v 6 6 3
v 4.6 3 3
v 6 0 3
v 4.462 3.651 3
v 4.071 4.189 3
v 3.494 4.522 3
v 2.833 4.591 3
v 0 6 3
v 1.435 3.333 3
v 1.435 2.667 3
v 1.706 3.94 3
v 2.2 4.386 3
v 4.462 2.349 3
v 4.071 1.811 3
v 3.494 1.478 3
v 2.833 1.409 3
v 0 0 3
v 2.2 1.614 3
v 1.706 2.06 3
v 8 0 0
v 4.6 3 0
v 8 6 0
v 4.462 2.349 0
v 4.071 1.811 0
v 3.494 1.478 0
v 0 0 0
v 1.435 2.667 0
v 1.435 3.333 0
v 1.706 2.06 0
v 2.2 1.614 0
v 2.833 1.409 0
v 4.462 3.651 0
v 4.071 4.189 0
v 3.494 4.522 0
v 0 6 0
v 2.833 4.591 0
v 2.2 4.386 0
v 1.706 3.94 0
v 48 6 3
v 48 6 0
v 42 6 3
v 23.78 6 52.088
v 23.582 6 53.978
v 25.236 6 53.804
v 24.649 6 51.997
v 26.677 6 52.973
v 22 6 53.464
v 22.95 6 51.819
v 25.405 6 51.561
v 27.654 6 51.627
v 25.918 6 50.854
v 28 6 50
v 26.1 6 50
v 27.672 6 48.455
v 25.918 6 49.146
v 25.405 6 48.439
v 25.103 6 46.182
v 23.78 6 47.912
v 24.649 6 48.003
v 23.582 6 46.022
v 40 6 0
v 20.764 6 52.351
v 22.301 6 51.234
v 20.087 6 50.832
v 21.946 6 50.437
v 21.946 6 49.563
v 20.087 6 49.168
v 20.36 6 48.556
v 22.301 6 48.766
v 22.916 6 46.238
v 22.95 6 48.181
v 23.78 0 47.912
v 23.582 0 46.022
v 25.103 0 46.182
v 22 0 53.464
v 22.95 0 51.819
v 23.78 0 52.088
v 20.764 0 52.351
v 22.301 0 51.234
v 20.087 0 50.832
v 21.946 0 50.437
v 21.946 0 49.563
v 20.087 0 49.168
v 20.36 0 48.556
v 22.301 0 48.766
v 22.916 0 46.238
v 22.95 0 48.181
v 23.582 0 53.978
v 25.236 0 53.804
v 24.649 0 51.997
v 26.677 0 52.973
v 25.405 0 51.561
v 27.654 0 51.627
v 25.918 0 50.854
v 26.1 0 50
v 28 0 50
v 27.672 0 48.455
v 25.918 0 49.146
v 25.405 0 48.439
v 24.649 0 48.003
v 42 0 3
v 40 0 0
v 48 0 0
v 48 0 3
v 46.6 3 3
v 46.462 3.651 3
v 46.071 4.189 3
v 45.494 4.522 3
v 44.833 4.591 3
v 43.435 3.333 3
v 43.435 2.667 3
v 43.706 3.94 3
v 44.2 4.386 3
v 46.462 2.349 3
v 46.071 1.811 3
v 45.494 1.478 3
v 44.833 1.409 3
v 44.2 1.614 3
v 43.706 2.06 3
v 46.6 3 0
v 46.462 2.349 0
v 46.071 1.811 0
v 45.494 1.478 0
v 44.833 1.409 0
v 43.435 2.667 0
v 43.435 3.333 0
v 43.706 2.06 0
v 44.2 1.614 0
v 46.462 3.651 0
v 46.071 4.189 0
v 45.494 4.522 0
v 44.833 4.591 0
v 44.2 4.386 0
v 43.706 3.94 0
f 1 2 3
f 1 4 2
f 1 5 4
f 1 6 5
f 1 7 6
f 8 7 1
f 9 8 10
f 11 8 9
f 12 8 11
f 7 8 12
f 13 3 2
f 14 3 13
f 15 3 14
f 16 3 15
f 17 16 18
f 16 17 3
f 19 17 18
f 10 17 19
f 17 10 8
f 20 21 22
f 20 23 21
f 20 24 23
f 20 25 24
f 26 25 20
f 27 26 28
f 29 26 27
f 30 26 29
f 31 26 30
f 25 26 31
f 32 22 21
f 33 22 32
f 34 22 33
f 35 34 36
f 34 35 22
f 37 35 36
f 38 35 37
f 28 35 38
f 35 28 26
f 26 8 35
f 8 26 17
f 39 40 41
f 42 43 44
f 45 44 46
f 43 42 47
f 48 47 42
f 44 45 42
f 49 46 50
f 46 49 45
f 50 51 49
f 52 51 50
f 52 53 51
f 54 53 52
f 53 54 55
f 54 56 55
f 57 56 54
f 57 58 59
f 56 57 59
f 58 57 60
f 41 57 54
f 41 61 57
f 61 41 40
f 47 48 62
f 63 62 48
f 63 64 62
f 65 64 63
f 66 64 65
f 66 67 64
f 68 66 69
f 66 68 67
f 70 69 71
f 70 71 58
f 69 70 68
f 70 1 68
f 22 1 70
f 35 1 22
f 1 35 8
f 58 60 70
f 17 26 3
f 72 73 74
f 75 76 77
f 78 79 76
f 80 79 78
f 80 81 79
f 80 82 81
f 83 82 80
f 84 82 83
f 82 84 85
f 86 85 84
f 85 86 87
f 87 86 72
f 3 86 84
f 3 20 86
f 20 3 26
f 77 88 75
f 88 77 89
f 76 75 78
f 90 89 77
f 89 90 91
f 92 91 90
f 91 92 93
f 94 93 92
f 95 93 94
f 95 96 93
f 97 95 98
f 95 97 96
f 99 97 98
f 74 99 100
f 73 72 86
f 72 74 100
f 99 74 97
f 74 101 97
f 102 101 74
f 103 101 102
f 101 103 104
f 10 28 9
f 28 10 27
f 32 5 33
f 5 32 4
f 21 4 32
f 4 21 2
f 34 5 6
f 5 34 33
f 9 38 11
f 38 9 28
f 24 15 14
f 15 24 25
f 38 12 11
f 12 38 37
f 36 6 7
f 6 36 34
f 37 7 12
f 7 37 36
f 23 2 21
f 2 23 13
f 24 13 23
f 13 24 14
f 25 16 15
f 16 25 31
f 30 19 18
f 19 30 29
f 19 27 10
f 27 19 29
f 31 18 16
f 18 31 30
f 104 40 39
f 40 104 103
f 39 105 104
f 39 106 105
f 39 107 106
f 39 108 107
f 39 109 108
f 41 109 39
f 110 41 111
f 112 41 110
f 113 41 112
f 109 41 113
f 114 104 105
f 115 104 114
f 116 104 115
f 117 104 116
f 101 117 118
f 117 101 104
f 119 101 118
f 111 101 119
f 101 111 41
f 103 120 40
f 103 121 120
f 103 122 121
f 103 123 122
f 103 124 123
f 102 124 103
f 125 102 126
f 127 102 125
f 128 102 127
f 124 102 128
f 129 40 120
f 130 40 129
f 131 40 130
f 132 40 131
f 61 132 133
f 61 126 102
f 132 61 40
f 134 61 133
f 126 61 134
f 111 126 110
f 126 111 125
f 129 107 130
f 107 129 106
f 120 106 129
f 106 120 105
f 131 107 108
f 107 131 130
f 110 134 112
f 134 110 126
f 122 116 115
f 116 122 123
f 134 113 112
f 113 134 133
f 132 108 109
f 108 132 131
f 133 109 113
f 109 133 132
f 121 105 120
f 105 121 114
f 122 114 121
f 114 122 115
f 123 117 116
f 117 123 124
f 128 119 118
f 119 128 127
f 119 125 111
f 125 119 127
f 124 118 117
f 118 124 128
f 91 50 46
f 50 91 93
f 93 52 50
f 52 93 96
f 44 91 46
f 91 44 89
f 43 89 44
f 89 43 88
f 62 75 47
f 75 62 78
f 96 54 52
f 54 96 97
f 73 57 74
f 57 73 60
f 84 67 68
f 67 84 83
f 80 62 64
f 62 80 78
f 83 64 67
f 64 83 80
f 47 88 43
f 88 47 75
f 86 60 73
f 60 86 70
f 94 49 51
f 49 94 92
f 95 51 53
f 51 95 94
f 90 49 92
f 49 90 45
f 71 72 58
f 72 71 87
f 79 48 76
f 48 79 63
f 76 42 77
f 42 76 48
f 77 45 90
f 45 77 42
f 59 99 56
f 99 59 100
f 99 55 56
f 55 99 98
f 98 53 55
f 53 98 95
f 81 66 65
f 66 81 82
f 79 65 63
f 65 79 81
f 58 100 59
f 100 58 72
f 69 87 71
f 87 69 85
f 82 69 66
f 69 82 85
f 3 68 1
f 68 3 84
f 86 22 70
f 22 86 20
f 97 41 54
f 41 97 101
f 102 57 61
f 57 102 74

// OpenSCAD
$fn = 15;

module holder() {
    difference() {
        cube([6, 6, 3]);
        
        translate([3, 3, -1])
            cylinder(d = 3.2, h = 5);
    }
}

module top() {
    rotate([90, 0, 0])
    difference() {
        cylinder(d = 8, h = 6);
        translate([0, 0, -1])
            cylinder(d = 4.2, h = 8);
    }
}

module prism(l, w, h){
    polyhedron(points = [
        [0,0,0],
        [l,0,0],
        [l,w,0],
        [0,w,0],
        [0,w,h],
        [l,w,h]
    ], faces = [
        [0,1,2,3],
        [5,4,3,2],
        [0,4,5,1],
        [0,3,4],
        [5,2,1]
    ]);
}

module adaptor() {
    polyhedron(points = [
        [6, 6, 3],
        [8, 6, 0],
        [8, 0, 0],
        [6, 0, 3],
        [20.5, 6, 49],
        [23, 6, 46.5],
        [23, 0, 46.5],
        [20.5, 0, 49]
    ], faces = [
        [3, 2, 1, 0], // a
        [0, 4, 7, 3], // b
        [1, 5, 4, 0], // c
        [2, 6, 5, 1], // d
        [2, 3, 7, 6], // e
        [4, 5, 6, 7] // f
    ]);
    
    
    translate([8, 0, 0])
        rotate([0, 0, 90])
        prism(6, 2, 3);
    
    
    /*
    difference() {
        translate([6, 0, 3])
            rotate([0, 45, 0])
            translate([0, 0, -5])
            cube([3.5, 6, 5]);
        
        translate([0, 0, -10])
            cube([10, 10, 10]);
    }
    */
}

holder();
translate([42, 0, 0])
    holder();

translate([48 / 2, 6, 50])
    top();

adaptor();
translate([48, 6, 0])
    rotate([0, 0, 180])
    adaptor();
